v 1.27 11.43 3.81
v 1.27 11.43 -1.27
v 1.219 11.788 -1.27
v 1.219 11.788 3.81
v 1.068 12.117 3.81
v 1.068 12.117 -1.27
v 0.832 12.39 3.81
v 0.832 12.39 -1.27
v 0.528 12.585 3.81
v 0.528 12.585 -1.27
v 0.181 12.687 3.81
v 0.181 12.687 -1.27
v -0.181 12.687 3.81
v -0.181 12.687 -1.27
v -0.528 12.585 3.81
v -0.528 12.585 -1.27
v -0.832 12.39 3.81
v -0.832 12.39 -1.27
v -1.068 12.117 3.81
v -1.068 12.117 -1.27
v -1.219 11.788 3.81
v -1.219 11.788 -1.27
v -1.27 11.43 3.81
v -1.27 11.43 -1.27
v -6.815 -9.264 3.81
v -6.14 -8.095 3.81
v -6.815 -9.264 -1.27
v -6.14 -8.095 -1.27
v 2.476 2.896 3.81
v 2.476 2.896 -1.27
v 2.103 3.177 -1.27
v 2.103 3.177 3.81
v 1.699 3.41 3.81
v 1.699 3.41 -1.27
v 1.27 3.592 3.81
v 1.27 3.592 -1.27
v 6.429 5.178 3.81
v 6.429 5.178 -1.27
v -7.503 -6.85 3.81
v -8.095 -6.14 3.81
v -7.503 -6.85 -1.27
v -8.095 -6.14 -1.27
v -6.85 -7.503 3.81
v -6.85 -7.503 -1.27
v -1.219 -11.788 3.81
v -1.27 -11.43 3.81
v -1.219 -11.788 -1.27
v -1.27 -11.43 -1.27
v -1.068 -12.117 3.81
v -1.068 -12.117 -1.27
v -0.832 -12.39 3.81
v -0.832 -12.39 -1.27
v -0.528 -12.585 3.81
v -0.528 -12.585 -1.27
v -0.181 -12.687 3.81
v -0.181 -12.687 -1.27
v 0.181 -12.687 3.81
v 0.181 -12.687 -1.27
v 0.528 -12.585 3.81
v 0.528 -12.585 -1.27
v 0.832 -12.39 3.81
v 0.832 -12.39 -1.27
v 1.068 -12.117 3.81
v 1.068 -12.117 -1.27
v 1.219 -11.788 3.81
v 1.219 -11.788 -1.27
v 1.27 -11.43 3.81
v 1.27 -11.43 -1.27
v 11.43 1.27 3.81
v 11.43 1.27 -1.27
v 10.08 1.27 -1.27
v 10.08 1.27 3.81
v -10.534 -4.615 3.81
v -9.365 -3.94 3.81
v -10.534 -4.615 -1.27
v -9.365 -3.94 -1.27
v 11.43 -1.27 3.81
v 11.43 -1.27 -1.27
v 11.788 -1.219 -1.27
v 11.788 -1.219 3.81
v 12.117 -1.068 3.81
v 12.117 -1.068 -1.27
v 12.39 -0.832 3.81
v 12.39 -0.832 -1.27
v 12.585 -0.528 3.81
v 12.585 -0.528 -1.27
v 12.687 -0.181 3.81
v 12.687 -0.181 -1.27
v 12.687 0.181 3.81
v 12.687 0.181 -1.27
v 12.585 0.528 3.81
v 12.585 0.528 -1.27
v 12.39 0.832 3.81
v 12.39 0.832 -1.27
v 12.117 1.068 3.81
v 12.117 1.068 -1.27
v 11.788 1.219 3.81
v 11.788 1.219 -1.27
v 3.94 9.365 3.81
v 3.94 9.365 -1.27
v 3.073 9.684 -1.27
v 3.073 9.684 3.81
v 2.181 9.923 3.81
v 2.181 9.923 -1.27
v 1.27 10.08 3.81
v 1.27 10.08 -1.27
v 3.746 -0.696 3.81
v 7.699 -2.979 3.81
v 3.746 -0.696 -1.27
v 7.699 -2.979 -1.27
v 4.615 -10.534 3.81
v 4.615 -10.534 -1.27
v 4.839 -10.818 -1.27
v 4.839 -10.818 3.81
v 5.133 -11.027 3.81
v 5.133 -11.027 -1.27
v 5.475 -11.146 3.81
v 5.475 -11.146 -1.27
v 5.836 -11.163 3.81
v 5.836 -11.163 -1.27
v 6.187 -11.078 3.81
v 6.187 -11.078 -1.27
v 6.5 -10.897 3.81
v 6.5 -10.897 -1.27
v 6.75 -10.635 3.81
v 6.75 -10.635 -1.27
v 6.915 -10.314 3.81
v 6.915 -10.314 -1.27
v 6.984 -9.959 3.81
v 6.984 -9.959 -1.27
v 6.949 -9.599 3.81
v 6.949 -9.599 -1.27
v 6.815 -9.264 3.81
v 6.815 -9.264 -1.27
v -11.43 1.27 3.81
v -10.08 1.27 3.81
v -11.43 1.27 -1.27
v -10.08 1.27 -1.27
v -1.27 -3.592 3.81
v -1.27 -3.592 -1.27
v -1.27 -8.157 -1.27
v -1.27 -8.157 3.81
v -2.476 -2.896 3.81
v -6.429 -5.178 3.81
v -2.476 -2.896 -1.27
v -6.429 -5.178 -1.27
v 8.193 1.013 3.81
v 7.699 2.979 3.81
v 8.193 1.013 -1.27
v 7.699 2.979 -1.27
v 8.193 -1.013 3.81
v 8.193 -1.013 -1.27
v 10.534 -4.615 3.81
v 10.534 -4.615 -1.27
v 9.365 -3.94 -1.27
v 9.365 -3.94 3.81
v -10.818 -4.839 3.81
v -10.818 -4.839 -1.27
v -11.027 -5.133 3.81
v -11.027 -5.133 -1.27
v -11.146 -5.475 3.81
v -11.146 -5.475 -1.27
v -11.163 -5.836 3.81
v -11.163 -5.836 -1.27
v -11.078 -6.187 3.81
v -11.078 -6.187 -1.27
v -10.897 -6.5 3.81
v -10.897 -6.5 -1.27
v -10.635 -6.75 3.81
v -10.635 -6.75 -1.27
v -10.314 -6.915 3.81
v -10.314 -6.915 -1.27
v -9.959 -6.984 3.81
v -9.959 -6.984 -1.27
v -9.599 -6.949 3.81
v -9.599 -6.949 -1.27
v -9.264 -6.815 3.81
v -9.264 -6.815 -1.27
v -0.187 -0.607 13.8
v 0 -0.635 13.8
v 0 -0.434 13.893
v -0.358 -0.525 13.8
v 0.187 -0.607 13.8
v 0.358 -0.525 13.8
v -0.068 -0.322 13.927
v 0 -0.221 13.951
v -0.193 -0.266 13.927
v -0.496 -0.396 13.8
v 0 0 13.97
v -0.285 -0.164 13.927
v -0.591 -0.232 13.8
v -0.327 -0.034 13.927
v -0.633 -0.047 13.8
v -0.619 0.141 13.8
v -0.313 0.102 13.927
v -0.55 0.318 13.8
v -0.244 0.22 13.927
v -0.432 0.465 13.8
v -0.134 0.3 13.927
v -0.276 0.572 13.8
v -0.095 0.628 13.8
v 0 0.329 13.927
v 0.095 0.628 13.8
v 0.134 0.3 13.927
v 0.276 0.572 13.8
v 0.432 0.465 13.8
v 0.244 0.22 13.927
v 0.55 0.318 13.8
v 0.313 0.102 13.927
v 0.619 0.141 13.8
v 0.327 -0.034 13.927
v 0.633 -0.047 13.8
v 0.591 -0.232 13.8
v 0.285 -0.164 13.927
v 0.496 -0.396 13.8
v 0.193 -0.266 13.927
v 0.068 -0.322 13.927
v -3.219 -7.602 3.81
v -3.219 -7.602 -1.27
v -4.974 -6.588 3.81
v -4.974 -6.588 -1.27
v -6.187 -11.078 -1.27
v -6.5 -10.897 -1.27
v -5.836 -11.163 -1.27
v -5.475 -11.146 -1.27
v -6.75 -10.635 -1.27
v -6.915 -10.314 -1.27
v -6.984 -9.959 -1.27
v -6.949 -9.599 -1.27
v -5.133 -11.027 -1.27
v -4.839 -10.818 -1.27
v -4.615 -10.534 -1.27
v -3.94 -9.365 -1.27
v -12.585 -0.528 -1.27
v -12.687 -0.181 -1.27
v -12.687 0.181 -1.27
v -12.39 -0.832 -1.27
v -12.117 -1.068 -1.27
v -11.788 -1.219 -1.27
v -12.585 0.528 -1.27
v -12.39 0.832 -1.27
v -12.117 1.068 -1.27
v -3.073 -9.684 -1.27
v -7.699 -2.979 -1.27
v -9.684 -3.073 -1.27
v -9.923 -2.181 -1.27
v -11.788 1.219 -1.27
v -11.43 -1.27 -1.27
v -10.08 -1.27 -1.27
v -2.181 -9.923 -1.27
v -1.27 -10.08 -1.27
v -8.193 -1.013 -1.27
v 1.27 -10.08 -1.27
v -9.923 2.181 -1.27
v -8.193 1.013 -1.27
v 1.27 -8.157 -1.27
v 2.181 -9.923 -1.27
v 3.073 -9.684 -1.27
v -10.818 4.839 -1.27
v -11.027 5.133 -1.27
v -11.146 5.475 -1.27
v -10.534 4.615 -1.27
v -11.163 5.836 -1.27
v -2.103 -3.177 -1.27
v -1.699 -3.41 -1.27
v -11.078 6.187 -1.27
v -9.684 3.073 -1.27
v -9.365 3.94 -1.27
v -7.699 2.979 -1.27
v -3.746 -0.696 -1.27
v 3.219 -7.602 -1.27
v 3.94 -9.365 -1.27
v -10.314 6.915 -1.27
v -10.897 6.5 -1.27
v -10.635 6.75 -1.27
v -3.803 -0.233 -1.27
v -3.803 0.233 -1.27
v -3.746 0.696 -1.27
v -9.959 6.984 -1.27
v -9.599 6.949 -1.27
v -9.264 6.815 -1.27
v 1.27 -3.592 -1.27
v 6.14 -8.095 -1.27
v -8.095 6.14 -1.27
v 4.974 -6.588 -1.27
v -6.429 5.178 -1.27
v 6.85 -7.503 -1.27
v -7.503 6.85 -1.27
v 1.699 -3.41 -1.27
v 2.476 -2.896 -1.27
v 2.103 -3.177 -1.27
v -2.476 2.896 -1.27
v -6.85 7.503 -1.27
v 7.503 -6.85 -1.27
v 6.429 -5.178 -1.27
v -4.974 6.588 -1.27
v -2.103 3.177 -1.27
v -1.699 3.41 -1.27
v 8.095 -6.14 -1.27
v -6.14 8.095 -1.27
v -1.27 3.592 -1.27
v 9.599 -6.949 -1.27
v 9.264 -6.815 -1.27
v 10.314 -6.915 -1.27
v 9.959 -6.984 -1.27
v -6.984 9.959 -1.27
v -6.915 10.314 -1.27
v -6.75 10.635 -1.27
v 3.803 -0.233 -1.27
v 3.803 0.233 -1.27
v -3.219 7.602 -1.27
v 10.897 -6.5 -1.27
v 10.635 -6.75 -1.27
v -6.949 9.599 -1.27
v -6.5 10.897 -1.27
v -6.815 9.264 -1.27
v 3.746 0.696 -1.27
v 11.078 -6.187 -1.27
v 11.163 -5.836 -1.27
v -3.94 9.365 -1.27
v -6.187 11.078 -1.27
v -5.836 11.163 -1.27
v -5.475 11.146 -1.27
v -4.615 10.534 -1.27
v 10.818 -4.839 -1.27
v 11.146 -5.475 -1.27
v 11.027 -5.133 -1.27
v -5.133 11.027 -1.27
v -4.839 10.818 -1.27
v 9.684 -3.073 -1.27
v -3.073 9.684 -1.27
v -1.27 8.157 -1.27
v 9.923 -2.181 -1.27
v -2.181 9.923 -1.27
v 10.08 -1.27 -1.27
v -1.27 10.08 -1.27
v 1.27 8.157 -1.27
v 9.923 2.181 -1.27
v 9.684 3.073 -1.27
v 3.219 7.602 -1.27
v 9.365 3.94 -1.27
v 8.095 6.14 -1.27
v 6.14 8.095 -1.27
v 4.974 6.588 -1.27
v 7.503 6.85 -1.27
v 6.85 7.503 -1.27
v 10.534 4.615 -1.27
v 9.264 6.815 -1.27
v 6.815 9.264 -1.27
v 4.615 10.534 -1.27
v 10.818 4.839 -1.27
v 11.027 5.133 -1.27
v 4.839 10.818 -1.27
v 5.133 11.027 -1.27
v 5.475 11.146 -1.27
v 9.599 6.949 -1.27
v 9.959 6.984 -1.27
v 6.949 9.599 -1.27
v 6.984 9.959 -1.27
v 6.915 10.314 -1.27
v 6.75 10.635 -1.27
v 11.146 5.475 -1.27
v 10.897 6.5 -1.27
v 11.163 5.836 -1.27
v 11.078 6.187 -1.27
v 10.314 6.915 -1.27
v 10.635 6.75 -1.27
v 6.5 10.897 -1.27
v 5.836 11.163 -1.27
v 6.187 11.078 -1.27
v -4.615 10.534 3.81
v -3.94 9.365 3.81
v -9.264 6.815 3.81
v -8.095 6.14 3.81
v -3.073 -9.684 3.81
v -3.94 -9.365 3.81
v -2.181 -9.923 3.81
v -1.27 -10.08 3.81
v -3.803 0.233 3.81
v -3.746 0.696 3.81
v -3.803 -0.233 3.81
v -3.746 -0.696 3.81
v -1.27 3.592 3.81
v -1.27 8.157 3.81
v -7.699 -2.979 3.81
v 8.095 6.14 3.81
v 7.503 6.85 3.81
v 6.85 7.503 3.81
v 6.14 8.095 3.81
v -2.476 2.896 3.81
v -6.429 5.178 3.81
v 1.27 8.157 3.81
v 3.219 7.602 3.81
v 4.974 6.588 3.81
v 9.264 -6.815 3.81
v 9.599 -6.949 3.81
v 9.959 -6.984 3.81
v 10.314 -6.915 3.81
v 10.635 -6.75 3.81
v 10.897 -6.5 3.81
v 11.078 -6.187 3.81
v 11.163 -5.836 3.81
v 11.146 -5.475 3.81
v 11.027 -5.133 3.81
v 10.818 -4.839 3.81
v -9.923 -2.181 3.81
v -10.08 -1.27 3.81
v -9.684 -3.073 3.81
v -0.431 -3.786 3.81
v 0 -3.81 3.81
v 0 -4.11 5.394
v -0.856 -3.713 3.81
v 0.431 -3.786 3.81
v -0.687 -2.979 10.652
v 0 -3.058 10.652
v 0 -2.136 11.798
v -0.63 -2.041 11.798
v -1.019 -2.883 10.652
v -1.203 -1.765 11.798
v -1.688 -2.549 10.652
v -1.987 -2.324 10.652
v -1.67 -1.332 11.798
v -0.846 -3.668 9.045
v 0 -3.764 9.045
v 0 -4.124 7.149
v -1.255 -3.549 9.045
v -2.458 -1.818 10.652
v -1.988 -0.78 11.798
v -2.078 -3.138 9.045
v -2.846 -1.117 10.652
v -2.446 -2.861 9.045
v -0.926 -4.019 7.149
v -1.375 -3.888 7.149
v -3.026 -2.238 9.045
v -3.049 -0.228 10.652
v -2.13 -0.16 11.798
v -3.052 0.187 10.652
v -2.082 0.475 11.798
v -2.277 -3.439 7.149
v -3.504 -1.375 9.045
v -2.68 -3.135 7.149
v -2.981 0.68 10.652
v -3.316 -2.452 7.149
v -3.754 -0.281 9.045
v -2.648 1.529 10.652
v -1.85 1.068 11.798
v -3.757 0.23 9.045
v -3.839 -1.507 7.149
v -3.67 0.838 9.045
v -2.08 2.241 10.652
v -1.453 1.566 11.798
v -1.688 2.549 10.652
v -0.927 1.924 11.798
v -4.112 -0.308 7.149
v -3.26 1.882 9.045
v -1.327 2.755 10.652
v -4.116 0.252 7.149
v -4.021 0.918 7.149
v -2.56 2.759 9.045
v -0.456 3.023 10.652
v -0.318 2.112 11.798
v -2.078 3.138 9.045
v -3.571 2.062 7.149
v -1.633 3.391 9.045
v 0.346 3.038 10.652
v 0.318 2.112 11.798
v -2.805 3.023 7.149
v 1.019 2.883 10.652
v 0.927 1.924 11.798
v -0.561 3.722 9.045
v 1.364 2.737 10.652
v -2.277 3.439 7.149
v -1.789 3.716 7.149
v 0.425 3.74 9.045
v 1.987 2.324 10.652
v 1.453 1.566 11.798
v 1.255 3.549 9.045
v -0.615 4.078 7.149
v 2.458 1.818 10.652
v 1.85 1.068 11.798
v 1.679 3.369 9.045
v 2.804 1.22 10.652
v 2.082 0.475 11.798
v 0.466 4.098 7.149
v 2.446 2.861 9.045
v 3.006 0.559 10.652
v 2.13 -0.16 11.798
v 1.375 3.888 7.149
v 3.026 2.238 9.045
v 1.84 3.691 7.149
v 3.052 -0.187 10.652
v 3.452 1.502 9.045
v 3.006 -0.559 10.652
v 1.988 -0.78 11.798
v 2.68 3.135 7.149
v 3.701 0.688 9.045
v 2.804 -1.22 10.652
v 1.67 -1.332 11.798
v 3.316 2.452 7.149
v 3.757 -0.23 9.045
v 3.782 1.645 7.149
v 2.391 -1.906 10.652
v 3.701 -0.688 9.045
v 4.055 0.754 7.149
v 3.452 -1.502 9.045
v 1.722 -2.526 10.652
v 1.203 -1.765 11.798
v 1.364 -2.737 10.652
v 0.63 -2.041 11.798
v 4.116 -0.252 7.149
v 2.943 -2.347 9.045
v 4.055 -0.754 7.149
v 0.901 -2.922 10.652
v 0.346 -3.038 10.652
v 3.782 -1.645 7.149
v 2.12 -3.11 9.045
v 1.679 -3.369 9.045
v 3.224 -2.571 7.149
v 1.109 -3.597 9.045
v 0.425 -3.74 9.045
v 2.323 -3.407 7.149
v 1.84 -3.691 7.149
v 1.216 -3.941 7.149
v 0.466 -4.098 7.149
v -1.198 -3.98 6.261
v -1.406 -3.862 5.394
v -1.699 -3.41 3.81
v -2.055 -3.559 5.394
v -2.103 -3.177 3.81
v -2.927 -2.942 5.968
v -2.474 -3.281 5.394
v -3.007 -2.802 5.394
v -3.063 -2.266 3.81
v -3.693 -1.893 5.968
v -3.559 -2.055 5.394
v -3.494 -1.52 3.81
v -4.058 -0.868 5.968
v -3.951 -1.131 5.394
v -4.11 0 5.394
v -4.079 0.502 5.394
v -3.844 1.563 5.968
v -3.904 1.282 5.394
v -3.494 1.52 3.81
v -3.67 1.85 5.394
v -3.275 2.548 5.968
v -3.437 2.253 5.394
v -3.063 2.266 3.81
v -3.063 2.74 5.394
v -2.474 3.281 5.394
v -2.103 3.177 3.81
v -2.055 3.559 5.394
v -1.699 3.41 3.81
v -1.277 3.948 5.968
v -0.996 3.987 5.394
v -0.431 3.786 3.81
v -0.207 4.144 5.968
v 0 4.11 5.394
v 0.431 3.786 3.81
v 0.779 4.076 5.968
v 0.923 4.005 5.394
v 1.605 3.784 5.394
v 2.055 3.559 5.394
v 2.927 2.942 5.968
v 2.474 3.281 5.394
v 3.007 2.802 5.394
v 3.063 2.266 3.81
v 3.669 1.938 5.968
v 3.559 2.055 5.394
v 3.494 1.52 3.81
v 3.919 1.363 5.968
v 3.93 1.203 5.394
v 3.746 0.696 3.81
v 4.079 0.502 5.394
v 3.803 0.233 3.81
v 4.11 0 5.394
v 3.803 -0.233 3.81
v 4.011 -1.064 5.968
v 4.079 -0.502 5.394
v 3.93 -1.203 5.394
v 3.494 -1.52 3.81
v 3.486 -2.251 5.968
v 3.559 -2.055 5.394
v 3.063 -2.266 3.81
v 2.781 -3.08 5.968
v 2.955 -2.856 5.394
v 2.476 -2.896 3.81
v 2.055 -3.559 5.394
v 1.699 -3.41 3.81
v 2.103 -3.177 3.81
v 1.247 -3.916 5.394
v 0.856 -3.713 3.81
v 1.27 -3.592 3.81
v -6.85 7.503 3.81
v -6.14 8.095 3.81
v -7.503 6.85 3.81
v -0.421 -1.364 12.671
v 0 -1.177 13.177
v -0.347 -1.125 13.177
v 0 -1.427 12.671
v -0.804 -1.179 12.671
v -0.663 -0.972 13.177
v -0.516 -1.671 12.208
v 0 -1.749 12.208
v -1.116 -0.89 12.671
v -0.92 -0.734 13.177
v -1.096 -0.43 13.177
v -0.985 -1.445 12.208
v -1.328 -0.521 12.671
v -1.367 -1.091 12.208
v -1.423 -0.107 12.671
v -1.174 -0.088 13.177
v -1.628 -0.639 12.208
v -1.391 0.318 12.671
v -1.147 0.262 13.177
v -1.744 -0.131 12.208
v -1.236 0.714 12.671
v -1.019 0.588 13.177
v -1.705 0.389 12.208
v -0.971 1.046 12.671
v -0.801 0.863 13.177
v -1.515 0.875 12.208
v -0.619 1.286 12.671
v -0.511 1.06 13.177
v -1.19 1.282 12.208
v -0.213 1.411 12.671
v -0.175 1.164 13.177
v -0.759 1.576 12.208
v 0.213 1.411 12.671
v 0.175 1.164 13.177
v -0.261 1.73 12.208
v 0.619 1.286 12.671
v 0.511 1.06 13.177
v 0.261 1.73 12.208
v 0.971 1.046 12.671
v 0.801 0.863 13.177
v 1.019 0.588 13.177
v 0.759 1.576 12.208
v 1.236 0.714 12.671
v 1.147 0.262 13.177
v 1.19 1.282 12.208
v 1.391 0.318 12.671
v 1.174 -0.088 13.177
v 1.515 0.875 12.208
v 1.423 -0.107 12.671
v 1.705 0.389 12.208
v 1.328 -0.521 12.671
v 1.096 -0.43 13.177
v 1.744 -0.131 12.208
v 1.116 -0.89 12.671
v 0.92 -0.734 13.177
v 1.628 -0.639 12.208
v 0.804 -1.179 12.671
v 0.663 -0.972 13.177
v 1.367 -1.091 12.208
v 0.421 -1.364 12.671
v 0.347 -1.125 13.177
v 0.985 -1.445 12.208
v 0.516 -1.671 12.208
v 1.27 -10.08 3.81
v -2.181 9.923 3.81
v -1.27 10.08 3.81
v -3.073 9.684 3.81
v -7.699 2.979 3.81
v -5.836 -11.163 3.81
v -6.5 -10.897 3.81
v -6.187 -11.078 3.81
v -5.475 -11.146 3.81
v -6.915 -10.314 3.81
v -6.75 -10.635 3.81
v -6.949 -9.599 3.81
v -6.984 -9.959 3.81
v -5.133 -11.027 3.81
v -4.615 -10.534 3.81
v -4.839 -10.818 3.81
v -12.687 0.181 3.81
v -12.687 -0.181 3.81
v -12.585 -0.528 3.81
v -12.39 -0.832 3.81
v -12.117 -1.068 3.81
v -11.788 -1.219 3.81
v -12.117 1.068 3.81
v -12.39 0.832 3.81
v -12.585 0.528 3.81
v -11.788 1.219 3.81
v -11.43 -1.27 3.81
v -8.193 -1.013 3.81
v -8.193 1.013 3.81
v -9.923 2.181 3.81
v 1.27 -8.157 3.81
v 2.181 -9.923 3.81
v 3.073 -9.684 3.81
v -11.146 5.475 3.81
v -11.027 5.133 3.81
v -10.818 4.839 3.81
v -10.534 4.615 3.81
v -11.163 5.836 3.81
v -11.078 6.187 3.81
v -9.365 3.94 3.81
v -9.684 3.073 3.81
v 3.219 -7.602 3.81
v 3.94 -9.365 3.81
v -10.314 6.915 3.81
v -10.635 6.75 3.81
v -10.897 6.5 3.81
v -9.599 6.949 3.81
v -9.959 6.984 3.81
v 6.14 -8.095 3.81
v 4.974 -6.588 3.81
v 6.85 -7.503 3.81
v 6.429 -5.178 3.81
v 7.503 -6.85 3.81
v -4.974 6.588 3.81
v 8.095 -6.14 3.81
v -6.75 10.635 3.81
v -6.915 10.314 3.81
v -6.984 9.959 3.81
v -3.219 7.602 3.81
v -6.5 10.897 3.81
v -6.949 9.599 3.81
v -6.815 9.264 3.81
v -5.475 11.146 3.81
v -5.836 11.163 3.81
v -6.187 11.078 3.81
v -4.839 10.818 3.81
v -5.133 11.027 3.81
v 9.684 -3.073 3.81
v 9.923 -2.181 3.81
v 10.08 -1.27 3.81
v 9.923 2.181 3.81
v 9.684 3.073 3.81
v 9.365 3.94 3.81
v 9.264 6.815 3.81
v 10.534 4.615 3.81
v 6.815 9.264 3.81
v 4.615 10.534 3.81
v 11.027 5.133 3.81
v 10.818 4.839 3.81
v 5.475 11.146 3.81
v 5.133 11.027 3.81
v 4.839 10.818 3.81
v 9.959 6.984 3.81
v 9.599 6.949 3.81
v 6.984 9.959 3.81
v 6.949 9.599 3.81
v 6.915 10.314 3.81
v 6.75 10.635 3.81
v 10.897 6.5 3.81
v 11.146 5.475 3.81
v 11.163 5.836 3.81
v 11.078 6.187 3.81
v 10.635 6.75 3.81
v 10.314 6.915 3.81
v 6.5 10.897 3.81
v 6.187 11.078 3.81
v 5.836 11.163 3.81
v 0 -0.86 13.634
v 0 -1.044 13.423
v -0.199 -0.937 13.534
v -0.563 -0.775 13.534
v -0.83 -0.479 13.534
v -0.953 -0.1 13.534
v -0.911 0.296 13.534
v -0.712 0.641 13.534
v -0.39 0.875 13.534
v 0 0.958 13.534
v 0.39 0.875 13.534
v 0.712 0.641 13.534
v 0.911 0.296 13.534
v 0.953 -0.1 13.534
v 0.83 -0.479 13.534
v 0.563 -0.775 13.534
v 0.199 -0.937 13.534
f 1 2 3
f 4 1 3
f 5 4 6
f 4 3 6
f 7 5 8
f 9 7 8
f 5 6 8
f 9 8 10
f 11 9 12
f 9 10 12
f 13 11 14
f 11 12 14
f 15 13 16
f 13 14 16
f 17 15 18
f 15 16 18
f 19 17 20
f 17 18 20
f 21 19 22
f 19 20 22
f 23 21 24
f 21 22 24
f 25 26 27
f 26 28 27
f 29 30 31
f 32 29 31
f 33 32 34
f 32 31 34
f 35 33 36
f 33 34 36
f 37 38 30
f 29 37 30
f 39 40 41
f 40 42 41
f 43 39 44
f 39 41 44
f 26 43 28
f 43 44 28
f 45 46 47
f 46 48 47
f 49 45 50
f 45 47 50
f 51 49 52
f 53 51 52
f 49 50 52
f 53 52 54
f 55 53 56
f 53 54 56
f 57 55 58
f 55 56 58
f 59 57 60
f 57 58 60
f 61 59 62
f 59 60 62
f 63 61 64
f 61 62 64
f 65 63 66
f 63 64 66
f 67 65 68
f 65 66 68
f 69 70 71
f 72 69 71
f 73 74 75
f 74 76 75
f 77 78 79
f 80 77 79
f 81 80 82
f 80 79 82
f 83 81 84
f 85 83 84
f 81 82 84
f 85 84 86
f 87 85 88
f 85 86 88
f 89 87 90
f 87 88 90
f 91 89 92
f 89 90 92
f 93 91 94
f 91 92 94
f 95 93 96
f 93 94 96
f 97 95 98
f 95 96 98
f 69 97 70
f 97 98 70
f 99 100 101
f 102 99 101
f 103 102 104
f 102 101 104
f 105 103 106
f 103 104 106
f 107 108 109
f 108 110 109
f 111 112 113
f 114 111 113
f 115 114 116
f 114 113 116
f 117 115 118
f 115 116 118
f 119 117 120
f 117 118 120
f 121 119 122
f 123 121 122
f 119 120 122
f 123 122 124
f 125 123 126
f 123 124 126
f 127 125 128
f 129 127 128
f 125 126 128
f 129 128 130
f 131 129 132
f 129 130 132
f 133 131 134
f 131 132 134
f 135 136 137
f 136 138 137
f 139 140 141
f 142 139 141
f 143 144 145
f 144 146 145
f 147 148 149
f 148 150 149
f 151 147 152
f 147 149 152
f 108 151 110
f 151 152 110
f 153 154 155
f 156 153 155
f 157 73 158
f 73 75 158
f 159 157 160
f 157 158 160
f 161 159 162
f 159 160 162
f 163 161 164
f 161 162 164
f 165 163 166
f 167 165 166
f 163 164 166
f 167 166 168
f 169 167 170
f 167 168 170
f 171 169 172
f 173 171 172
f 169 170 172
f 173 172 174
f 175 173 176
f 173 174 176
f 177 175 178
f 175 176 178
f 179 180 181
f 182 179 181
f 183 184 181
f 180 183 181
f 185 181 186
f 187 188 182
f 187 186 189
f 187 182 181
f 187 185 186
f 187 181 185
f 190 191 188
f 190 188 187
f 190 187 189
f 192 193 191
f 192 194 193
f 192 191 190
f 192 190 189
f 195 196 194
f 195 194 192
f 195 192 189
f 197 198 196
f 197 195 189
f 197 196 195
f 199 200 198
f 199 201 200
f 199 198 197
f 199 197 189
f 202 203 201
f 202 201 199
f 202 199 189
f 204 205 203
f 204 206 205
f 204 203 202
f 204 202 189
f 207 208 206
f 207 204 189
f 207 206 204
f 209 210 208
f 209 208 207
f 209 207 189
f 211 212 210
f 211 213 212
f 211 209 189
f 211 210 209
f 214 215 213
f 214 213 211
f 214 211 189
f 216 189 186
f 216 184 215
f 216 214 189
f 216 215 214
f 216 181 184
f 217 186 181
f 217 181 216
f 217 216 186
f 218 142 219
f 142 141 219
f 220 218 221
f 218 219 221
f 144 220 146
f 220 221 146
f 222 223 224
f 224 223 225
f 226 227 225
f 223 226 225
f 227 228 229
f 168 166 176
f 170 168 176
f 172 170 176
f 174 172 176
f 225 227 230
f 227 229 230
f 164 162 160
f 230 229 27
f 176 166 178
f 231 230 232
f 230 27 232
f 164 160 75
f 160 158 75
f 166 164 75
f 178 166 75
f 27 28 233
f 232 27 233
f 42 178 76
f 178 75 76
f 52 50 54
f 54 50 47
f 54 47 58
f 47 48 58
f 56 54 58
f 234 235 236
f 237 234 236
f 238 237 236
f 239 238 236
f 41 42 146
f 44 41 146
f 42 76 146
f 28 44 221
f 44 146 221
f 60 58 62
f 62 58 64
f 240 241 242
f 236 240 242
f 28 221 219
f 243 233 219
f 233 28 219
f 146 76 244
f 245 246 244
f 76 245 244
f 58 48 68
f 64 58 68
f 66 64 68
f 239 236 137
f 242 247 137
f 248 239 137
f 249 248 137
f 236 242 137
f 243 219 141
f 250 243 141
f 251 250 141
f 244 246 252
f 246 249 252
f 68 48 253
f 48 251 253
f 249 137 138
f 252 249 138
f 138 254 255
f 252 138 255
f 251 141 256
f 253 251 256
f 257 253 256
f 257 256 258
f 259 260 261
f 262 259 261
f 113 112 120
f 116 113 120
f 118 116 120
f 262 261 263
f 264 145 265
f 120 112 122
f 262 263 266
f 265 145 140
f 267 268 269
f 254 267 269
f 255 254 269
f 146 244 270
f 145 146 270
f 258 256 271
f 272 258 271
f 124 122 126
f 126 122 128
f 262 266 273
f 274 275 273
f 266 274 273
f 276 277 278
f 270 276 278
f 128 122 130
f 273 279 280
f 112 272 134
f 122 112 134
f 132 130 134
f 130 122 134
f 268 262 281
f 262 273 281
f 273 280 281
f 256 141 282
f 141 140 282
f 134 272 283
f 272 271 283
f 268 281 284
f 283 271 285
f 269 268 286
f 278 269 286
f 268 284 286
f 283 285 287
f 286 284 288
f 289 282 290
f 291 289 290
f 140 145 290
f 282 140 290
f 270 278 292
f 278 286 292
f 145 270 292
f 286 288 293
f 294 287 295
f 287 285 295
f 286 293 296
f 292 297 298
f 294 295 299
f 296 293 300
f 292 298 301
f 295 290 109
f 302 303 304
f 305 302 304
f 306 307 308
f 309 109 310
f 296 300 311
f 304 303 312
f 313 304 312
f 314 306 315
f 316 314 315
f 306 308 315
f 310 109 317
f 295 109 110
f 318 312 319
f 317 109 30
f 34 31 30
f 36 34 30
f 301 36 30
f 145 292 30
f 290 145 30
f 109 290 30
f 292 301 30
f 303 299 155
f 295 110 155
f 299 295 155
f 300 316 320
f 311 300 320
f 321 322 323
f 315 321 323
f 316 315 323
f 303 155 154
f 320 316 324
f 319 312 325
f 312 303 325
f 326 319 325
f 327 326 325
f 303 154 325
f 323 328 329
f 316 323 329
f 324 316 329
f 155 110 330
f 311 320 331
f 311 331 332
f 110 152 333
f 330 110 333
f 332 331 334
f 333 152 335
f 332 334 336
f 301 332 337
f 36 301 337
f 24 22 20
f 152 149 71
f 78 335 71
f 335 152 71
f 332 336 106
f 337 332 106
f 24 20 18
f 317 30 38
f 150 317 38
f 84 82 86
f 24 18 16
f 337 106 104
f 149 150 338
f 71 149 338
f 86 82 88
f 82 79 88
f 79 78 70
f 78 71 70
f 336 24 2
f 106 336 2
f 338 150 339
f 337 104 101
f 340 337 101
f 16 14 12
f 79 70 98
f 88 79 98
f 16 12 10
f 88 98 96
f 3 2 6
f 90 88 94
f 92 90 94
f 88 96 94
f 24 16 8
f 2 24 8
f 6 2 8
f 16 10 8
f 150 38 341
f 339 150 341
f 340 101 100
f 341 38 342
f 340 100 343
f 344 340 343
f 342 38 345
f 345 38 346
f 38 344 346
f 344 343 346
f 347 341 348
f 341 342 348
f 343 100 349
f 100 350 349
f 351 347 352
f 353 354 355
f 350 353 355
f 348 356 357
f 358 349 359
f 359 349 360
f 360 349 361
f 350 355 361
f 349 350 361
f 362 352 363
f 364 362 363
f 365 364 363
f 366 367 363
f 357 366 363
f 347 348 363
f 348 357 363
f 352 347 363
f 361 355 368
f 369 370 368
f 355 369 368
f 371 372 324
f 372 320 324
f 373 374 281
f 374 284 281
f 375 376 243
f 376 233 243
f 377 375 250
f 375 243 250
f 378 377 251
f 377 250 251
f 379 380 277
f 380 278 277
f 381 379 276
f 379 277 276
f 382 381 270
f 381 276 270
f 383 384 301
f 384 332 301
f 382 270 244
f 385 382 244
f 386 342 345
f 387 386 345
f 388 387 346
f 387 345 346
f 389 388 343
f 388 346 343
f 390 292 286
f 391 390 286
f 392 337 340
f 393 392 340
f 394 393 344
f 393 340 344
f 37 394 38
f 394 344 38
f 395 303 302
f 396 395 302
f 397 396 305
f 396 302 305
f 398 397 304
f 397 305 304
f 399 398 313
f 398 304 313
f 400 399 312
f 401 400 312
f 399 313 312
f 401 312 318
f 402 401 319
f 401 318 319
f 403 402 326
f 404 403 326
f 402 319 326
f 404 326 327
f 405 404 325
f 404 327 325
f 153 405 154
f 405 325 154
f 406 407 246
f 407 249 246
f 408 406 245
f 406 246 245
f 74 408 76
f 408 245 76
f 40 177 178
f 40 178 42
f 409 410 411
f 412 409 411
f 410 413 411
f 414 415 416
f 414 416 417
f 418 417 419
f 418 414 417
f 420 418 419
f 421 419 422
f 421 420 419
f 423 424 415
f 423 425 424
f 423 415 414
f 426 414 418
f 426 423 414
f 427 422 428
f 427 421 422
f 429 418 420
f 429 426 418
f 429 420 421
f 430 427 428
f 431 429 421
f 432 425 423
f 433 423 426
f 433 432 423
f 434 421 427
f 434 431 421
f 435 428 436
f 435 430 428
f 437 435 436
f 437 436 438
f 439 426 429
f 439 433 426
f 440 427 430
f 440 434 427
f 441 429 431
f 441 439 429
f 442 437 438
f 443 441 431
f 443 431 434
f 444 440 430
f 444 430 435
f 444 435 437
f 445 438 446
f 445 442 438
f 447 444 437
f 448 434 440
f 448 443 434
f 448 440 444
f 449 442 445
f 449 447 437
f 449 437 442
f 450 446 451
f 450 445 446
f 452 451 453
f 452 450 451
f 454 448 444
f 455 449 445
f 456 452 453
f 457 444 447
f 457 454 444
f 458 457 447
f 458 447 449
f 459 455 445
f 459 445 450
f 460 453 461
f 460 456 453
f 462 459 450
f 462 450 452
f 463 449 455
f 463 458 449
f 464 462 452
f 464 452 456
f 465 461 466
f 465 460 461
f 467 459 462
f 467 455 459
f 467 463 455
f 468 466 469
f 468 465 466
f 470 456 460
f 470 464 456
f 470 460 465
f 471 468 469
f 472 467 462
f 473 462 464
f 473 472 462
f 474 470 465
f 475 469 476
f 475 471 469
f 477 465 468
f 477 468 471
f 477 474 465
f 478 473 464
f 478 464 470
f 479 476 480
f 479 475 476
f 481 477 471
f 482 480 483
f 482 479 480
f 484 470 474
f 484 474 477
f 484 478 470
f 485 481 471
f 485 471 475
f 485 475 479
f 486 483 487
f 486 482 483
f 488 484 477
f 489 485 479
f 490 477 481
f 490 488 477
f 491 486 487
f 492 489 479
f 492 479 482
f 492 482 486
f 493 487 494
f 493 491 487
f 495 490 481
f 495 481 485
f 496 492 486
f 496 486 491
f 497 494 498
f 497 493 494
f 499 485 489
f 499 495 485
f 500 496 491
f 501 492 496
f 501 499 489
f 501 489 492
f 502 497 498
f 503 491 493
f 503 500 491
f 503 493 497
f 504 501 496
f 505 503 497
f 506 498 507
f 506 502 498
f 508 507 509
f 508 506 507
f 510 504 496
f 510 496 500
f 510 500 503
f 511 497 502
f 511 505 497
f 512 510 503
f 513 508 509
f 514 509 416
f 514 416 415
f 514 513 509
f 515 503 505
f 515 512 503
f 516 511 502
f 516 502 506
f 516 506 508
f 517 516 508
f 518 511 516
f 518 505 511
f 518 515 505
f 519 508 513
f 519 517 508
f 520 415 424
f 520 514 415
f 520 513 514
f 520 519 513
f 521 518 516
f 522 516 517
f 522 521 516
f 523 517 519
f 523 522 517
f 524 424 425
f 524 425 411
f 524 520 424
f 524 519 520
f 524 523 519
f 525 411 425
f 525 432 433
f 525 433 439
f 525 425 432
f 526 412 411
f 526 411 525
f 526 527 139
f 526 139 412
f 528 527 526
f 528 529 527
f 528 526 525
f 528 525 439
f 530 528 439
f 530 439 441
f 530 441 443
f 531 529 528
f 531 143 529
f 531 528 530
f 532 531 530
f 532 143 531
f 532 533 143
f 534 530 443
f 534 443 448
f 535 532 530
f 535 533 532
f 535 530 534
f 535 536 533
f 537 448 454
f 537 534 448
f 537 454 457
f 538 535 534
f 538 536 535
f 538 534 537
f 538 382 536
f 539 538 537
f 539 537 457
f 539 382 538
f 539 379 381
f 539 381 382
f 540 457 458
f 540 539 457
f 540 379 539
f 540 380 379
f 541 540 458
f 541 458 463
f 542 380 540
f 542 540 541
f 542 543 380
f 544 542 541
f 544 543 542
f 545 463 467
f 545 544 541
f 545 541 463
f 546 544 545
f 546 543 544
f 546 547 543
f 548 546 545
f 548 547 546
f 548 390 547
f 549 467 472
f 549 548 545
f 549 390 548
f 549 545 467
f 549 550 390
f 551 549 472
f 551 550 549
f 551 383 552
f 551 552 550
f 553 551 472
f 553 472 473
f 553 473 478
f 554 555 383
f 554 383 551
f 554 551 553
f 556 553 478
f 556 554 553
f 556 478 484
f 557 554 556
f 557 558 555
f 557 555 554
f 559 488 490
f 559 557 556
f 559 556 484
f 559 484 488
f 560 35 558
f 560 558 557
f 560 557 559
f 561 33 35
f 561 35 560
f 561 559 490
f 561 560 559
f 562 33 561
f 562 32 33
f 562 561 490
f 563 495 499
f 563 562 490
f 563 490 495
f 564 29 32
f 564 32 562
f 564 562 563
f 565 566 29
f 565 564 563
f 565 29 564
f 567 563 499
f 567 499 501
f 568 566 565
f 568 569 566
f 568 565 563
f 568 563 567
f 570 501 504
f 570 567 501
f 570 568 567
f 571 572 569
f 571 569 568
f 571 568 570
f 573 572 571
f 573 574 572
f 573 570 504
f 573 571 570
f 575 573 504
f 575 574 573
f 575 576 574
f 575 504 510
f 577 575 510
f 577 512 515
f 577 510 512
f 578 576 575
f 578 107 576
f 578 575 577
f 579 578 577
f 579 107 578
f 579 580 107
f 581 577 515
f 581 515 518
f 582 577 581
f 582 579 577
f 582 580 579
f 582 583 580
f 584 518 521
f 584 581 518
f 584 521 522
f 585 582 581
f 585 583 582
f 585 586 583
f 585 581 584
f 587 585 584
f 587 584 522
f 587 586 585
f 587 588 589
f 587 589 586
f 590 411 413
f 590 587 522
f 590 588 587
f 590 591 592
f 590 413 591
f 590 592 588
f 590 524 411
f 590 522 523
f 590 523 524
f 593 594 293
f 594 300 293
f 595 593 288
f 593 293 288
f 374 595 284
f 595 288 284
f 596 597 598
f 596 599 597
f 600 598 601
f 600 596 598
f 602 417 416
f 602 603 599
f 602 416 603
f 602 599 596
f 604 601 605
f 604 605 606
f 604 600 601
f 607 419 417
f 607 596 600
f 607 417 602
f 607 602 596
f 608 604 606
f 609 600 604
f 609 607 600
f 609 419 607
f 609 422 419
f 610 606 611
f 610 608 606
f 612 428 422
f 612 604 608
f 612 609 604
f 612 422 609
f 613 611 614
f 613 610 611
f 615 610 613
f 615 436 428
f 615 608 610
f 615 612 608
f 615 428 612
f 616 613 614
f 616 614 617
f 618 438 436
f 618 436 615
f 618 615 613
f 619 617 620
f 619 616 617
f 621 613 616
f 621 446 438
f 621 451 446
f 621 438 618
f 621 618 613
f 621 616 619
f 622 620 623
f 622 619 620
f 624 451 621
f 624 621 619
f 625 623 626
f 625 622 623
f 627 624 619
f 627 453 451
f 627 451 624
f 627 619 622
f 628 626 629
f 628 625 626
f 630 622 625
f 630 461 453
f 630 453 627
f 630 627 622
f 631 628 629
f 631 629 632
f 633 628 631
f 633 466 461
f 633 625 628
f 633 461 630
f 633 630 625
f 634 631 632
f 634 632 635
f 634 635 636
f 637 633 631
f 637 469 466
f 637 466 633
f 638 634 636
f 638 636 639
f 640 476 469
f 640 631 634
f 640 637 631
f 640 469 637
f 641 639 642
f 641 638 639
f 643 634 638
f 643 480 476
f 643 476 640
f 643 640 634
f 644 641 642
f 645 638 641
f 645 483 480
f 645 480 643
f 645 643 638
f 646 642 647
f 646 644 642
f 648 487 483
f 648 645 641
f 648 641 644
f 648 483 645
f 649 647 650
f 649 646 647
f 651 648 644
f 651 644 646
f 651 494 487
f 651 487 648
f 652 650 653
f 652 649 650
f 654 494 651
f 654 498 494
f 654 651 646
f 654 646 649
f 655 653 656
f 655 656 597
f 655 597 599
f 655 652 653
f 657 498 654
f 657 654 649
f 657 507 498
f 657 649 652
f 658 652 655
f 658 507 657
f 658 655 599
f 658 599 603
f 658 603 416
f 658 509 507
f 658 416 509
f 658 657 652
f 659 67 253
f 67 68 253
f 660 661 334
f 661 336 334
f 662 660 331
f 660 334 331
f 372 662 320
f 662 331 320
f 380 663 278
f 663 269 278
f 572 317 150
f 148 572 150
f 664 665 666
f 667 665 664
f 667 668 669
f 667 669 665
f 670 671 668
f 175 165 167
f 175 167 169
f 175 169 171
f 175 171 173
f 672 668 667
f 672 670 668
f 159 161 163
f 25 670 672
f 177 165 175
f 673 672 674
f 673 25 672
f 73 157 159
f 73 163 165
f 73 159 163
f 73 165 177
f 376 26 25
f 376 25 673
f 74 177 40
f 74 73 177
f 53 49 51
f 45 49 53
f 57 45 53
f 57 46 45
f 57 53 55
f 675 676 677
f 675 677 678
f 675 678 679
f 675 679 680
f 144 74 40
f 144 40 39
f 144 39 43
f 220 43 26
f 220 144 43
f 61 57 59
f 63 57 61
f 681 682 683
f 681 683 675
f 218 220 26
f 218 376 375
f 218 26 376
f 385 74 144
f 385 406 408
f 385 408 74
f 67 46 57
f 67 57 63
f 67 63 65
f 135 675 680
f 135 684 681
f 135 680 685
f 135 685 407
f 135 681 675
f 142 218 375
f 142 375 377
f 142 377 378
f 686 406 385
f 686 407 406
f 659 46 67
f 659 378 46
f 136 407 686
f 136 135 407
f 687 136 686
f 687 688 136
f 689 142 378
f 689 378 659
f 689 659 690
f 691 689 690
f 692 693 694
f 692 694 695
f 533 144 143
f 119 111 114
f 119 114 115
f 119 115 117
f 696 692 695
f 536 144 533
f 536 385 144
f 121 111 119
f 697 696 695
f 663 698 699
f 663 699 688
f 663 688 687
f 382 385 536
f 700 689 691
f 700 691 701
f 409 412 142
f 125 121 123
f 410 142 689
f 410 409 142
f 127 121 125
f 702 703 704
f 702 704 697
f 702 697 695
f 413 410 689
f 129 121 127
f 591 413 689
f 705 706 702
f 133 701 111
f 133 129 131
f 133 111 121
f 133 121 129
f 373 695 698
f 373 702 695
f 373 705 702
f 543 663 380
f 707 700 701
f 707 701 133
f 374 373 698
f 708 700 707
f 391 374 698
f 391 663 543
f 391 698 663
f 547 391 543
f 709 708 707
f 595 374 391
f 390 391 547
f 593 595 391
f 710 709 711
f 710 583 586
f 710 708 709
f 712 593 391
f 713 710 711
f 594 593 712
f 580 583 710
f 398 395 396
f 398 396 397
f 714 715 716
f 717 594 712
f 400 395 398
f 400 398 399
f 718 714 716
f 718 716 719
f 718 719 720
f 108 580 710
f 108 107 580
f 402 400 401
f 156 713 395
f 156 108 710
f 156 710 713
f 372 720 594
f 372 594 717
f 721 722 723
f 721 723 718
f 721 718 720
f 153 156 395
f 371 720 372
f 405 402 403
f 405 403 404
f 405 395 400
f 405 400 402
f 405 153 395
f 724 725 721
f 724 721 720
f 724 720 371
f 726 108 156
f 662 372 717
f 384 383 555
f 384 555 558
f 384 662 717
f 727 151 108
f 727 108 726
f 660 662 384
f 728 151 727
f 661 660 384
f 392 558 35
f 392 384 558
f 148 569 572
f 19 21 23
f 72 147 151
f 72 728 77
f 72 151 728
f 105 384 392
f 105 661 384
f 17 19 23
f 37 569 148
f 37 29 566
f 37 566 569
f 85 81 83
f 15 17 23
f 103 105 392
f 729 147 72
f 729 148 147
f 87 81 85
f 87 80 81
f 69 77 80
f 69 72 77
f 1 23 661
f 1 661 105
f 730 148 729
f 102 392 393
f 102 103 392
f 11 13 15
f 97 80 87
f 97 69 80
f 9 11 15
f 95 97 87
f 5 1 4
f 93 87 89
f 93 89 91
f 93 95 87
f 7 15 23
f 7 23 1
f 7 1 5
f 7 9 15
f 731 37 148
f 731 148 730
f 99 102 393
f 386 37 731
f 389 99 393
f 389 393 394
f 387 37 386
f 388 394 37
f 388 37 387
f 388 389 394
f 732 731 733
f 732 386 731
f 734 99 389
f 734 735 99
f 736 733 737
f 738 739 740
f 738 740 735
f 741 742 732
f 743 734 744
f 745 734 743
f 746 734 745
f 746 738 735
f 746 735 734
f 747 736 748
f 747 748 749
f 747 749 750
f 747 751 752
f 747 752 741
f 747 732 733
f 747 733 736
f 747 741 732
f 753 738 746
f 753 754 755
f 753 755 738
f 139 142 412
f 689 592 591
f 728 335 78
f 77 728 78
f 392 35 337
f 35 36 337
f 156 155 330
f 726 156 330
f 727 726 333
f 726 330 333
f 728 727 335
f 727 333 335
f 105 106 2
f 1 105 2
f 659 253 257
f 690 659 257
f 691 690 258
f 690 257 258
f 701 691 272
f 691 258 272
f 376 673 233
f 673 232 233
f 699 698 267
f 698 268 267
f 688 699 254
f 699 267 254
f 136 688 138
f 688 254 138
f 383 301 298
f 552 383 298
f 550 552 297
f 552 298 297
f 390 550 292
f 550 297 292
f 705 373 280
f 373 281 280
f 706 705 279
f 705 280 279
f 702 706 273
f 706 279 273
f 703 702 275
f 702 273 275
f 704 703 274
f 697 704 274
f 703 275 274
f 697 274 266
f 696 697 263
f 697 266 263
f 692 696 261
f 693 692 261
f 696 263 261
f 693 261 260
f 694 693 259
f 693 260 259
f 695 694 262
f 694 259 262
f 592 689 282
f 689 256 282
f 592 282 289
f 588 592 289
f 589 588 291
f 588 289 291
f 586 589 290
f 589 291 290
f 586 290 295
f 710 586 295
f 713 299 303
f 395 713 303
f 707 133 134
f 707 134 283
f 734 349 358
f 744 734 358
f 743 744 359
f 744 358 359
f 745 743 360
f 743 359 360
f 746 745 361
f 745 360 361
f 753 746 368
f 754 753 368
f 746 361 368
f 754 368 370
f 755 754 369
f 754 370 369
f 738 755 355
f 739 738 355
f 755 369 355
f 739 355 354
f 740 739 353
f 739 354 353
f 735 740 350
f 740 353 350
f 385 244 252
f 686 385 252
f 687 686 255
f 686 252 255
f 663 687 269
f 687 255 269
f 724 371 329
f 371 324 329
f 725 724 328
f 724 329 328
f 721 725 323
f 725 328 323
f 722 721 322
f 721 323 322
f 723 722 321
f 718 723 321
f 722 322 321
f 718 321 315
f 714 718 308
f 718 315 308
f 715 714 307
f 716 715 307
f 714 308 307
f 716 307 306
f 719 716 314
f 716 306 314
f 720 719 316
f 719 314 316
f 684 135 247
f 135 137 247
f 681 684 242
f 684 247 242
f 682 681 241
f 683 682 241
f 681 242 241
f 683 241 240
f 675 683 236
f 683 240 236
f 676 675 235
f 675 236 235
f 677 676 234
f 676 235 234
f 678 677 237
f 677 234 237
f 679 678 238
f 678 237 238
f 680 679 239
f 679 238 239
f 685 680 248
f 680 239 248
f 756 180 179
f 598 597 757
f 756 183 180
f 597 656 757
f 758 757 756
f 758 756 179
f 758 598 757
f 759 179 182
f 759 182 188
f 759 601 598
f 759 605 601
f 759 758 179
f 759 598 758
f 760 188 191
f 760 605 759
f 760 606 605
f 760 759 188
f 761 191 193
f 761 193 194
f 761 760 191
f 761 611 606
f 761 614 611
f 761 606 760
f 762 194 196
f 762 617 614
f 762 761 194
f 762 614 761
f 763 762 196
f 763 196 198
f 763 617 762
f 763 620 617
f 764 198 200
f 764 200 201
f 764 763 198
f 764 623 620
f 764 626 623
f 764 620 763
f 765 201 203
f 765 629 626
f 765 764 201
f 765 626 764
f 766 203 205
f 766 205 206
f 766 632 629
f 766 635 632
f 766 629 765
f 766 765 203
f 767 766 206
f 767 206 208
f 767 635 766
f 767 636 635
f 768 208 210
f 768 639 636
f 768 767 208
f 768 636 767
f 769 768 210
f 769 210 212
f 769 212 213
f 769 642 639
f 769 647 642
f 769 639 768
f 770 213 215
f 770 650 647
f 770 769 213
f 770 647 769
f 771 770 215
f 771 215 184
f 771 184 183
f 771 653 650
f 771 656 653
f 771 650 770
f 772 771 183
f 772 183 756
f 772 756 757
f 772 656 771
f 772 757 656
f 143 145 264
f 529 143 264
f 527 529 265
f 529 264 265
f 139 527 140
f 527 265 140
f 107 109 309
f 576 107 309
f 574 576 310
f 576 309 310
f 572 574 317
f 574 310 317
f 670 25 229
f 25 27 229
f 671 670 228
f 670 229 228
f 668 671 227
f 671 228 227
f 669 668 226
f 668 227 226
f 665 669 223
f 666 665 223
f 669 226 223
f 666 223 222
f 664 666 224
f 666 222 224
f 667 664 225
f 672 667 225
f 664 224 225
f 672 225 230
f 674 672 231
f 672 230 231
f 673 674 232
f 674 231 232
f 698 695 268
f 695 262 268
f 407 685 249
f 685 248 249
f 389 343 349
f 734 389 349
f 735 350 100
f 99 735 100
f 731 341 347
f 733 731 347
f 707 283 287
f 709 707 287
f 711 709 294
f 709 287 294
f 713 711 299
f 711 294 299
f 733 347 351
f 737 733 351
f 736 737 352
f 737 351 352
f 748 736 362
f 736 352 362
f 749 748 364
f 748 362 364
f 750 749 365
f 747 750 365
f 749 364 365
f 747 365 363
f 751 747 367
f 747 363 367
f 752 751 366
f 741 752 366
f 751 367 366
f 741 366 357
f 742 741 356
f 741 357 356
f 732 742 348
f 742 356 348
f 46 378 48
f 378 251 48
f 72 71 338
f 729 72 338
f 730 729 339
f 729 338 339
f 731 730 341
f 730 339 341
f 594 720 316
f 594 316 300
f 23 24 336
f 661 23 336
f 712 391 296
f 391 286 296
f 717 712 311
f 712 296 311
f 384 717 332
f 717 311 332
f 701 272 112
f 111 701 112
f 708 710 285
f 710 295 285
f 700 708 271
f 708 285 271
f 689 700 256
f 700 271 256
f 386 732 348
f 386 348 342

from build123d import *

# Parameters (mm, degrees)
F1_DEPTH = 1.27
F2_DEPTH = 3.81


with BuildPart() as f1:
    # F0 (on Top) → F1 (new body)
    with BuildSketch(Plane.XY):
        with BuildLine():
            Line((-1.27, 11.43), (-1.27, 10.0803124952))
            ThreePointArc((-1.27, 10.0803124952), (-2.6296014982, 9.8138063951), (-3.9403039848, 9.3648066989))
            Line((-3.9403039848, 9.3648066989), (-4.6151477372, 10.5336703653))
            ThreePointArc((-4.6151477372, 10.5336703653), (-6.35, 10.9985226281), (-6.8148522628, 9.2636703653))
            Line((-6.8148522628, 9.2636703653), (-6.1400085104, 8.0948066989))
            ThreePointArc((-6.1400085104, 8.0948066989), (-7.1842048969, 7.1842048969), (-8.0948066989, 6.1400085104))
            Line((-8.0948066989, 6.1400085104), (-9.2636703653, 6.8148522628))
            ThreePointArc((-9.2636703653, 6.8148522628), (-10.9985226281, 6.35), (-10.5336703653, 4.6151477372))
            Line((-10.5336703653, 4.6151477372), (-9.3648066989, 3.9403039848))
            ThreePointArc((-9.3648066989, 3.9403039848), (-9.8138063951, 2.6296014982), (-10.0803124952, 1.27))
            Line((-10.0803124952, 1.27), (-11.43, 1.27))
            ThreePointArc((-11.43, 1.27), (-12.7, 0), (-11.43, -1.27))
            Line((-11.43, -1.27), (-10.0803124952, -1.27))
            ThreePointArc((-10.0803124952, -1.27), (-9.8138063951, -2.6296014982), (-9.3648066989, -3.9403039848))
            Line((-9.3648066989, -3.9403039848), (-10.5336703653, -4.6151477372))
            ThreePointArc((-10.5336703653, -4.6151477372), (-10.9985226281, -6.35), (-9.2636703653, -6.8148522628))
            Line((-9.2636703653, -6.8148522628), (-8.0948066989, -6.1400085104))
            ThreePointArc((-8.0948066989, -6.1400085104), (-7.1842048969, -7.1842048969), (-6.1400085104, -8.0948066989))
            Line((-6.1400085104, -8.0948066989), (-6.8148522628, -9.2636703653))
            ThreePointArc((-6.8148522628, -9.2636703653), (-6.35, -10.9985226281), (-4.6151477372, -10.5336703653))
            Line((-4.6151477372, -10.5336703653), (-3.9403039848, -9.3648066989))
            ThreePointArc((-3.9403039848, -9.3648066989), (-2.6296014982, -9.8138063951), (-1.27, -10.0803124952))
            Line((-1.27, -10.0803124952), (-1.27, -11.43))
            ThreePointArc((-1.27, -11.43), (0, -12.7), (1.27, -11.43))
            Line((1.27, -11.43), (1.27, -10.0803124952))
            ThreePointArc((1.27, -10.0803124952), (2.6296014982, -9.8138063951), (3.9403039848, -9.3648066989))
            Line((3.9403039848, -9.3648066989), (4.6151477372, -10.5336703653))
            ThreePointArc((4.6151477372, -10.5336703653), (6.35, -10.9985226281), (6.8148522628, -9.2636703653))
            Line((6.8148522628, -9.2636703653), (6.1400085104, -8.0948066989))
            ThreePointArc((6.1400085104, -8.0948066989), (7.1842048969, -7.1842048969), (8.0948066989, -6.1400085104))
            Line((8.0948066989, -6.1400085104), (9.2636703653, -6.8148522628))
            ThreePointArc((9.2636703653, -6.8148522628), (10.9985226281, -6.35), (10.5336703653, -4.6151477372))
            Line((10.5336703653, -4.6151477372), (9.3648066989, -3.9403039848))
            ThreePointArc((9.3648066989, -3.9403039848), (9.8138063951, -2.6296014982), (10.0803124952, -1.27))
            Line((10.0803124952, -1.27), (11.43, -1.27))
            ThreePointArc((11.43, -1.27), (12.7, 0), (11.43, 1.27))
            Line((11.43, 1.27), (10.0803124952, 1.27))
            ThreePointArc((10.0803124952, 1.27), (9.8138063951, 2.6296014982), (9.3648066989, 3.9403039848))
            Line((9.3648066989, 3.9403039848), (10.5336703653, 4.6151477372))
            ThreePointArc((10.5336703653, 4.6151477372), (10.9985226281, 6.35), (9.2636703653, 6.8148522628))
            Line((9.2636703653, 6.8148522628), (8.0948066989, 6.1400085104))
            ThreePointArc((8.0948066989, 6.1400085104), (7.1842048969, 7.1842048969), (6.1400085104, 8.0948066989))
            Line((6.1400085104, 8.0948066989), (6.8148522628, 9.2636703653))
            ThreePointArc((6.8148522628, 9.2636703653), (6.35, 10.9985226281), (4.6151477372, 10.5336703653))
            Line((4.6151477372, 10.5336703653), (3.9403039848, 9.3648066989))
            ThreePointArc((3.9403039848, 9.3648066989), (2.6296014982, 9.8138063951), (1.27, 10.0803124952))
            Line((1.27, 10.0803124952), (1.27, 11.43))
            ThreePointArc((1.27, 11.43), (0, 12.7), (-1.27, 11.43))
        make_face()
        with BuildLine():
            ThreePointArc((-1.27, -8.1567226875), (-4.1275, -7.1490397082), (-6.428929059, -5.1782136065))
            Line((-6.428929059, -5.1782136065), (-2.4758519733, -2.895903487))
            ThreePointArc((-2.4758519733, -2.895903487), (-1.905, -3.2995567884), (-1.27, -3.5921024484))
            Line((-1.27, -3.5921024484), (-1.27, -8.1567226875))
        make_face(mode=Mode.SUBTRACT)
        with BuildLine():
            ThreePointArc((6.428929059, -5.1782136065), (4.1275, -7.1490397082), (1.27, -8.1567226875))
            Line((1.27, -8.1567226875), (1.27, -3.5921024484))
            ThreePointArc((1.27, -3.5921024484), (1.905, -3.2995567884), (2.4758519733, -2.895903487))
            Line((2.4758519733, -2.895903487), (6.428929059, -5.1782136065))
        make_face(mode=Mode.SUBTRACT)
        with BuildLine():
            ThreePointArc((7.698929059, 2.9785090809), (8.255, 0), (7.698929059, -2.9785090809))
            Line((7.698929059, -2.9785090809), (3.7458519733, -0.6961989614))
            ThreePointArc((3.7458519733, -0.6961989614), (3.81, 0), (3.7458519733, 0.6961989614))
            Line((3.7458519733, 0.6961989614), (7.698929059, 2.9785090809))
        make_face(mode=Mode.SUBTRACT)
        with BuildLine():
            Line((-7.698929059, 2.9785090809), (-3.7458519733, 0.6961989614))
            ThreePointArc((-3.7458519733, 0.6961989614), (-3.81, 0), (-3.7458519733, -0.6961989614))
            Line((-3.7458519733, -0.6961989614), (-7.698929059, -2.9785090809))
            ThreePointArc((-7.698929059, -2.9785090809), (-8.255, 0), (-7.698929059, 2.9785090809))
        make_face(mode=Mode.SUBTRACT)
        with BuildLine():
            ThreePointArc((-6.428929059, 5.1782136065), (-4.1275, 7.1490397082), (-1.27, 8.1567226875))
            Line((-1.27, 8.1567226875), (-1.27, 3.5921024484))
            ThreePointArc((-1.27, 3.5921024484), (-1.905, 3.2995567884), (-2.4758519733, 2.895903487))
            Line((-2.4758519733, 2.895903487), (-6.428929059, 5.1782136065))
        make_face(mode=Mode.SUBTRACT)
        with BuildLine():
            Line((1.27, 3.5921024484), (1.27, 8.1567226875))
            ThreePointArc((1.27, 8.1567226875), (4.1275, 7.1490397082), (6.428929059, 5.1782136065))
            Line((6.428929059, 5.1782136065), (2.4758519733, 2.895903487))
            ThreePointArc((2.4758519733, 2.895903487), (1.905, 3.2995567884), (1.27, 3.5921024484))
        make_face(mode=Mode.SUBTRACT)
    extrude(amount=-F1_DEPTH)

    # F0 (on Top) → F2 (join)
    with BuildSketch(Plane.XY):
        with BuildLine():
            Line((-1.27, 11.43), (-1.27, 10.0803124952))
            ThreePointArc((-1.27, 10.0803124952), (-2.6296014982, 9.8138063951), (-3.9403039848, 9.3648066989))
            Line((-3.9403039848, 9.3648066989), (-4.6151477372, 10.5336703653))
            ThreePointArc((-4.6151477372, 10.5336703653), (-6.35, 10.9985226281), (-6.8148522628, 9.2636703653))
            Line((-6.8148522628, 9.2636703653), (-6.1400085104, 8.0948066989))
            ThreePointArc((-6.1400085104, 8.0948066989), (-7.1842048969, 7.1842048969), (-8.0948066989, 6.1400085104))
            Line((-8.0948066989, 6.1400085104), (-9.2636703653, 6.8148522628))
            ThreePointArc((-9.2636703653, 6.8148522628), (-10.9985226281, 6.35), (-10.5336703653, 4.6151477372))
            Line((-10.5336703653, 4.6151477372), (-9.3648066989, 3.9403039848))
            ThreePointArc((-9.3648066989, 3.9403039848), (-9.8138063951, 2.6296014982), (-10.0803124952, 1.27))
            Line((-10.0803124952, 1.27), (-11.43, 1.27))
            ThreePointArc((-11.43, 1.27), (-12.7, 0), (-11.43, -1.27))
            Line((-11.43, -1.27), (-10.0803124952, -1.27))
            ThreePointArc((-10.0803124952, -1.27), (-9.8138063951, -2.6296014982), (-9.3648066989, -3.9403039848))
            Line((-9.3648066989, -3.9403039848), (-10.5336703653, -4.6151477372))
            ThreePointArc((-10.5336703653, -4.6151477372), (-10.9985226281, -6.35), (-9.2636703653, -6.8148522628))
            Line((-9.2636703653, -6.8148522628), (-8.0948066989, -6.1400085104))
            ThreePointArc((-8.0948066989, -6.1400085104), (-7.1842048969, -7.1842048969), (-6.1400085104, -8.0948066989))
            Line((-6.1400085104, -8.0948066989), (-6.8148522628, -9.2636703653))
            ThreePointArc((-6.8148522628, -9.2636703653), (-6.35, -10.9985226281), (-4.6151477372, -10.5336703653))
            Line((-4.6151477372, -10.5336703653), (-3.9403039848, -9.3648066989))
            ThreePointArc((-3.9403039848, -9.3648066989), (-2.6296014982, -9.8138063951), (-1.27, -10.0803124952))
            Line((-1.27, -10.0803124952), (-1.27, -11.43))
            ThreePointArc((-1.27, -11.43), (0, -12.7), (1.27, -11.43))
            Line((1.27, -11.43), (1.27, -10.0803124952))
            ThreePointArc((1.27, -10.0803124952), (2.6296014982, -9.8138063951), (3.9403039848, -9.3648066989))
            Line((3.9403039848, -9.3648066989), (4.6151477372, -10.5336703653))
            ThreePointArc((4.6151477372, -10.5336703653), (6.35, -10.9985226281), (6.8148522628, -9.2636703653))
            Line((6.8148522628, -9.2636703653), (6.1400085104, -8.0948066989))
            ThreePointArc((6.1400085104, -8.0948066989), (7.1842048969, -7.1842048969), (8.0948066989, -6.1400085104))
            Line((8.0948066989, -6.1400085104), (9.2636703653, -6.8148522628))
            ThreePointArc((9.2636703653, -6.8148522628), (10.9985226281, -6.35), (10.5336703653, -4.6151477372))
            Line((10.5336703653, -4.6151477372), (9.3648066989, -3.9403039848))
            ThreePointArc((9.3648066989, -3.9403039848), (9.8138063951, -2.6296014982), (10.0803124952, -1.27))
            Line((10.0803124952, -1.27), (11.43, -1.27))
            ThreePointArc((11.43, -1.27), (12.7, 0), (11.43, 1.27))
            Line((11.43, 1.27), (10.0803124952, 1.27))
            ThreePointArc((10.0803124952, 1.27), (9.8138063951, 2.6296014982), (9.3648066989, 3.9403039848))
            Line((9.3648066989, 3.9403039848), (10.5336703653, 4.6151477372))
            ThreePointArc((10.5336703653, 4.6151477372), (10.9985226281, 6.35), (9.2636703653, 6.8148522628))
            Line((9.2636703653, 6.8148522628), (8.0948066989, 6.1400085104))
            ThreePointArc((8.0948066989, 6.1400085104), (7.1842048969, 7.1842048969), (6.1400085104, 8.0948066989))
            Line((6.1400085104, 8.0948066989), (6.8148522628, 9.2636703653))
            ThreePointArc((6.8148522628, 9.2636703653), (6.35, 10.9985226281), (4.6151477372, 10.5336703653))
            Line((4.6151477372, 10.5336703653), (3.9403039848, 9.3648066989))
            ThreePointArc((3.9403039848, 9.3648066989), (2.6296014982, 9.8138063951), (1.27, 10.0803124952))
            Line((1.27, 10.0803124952), (1.27, 11.43))
            ThreePointArc((1.27, 11.43), (0, 12.7), (-1.27, 11.43))
        make_face()
        with BuildLine():
            ThreePointArc((-1.27, -8.1567226875), (-4.1275, -7.1490397082), (-6.428929059, -5.1782136065))
            Line((-6.428929059, -5.1782136065), (-2.4758519733, -2.895903487))
            ThreePointArc((-2.4758519733, -2.895903487), (-1.905, -3.2995567884), (-1.27, -3.5921024484))
            Line((-1.27, -3.5921024484), (-1.27, -8.1567226875))
        make_face(mode=Mode.SUBTRACT)
        with BuildLine():
            ThreePointArc((6.428929059, -5.1782136065), (4.1275, -7.1490397082), (1.27, -8.1567226875))
            Line((1.27, -8.1567226875), (1.27, -3.5921024484))
            ThreePointArc((1.27, -3.5921024484), (1.905, -3.2995567884), (2.4758519733, -2.895903487))
            Line((2.4758519733, -2.895903487), (6.428929059, -5.1782136065))
        make_face(mode=Mode.SUBTRACT)
        with BuildLine():
            ThreePointArc((7.698929059, 2.9785090809), (8.255, 0), (7.698929059, -2.9785090809))
            Line((7.698929059, -2.9785090809), (3.7458519733, -0.6961989614))
            ThreePointArc((3.7458519733, -0.6961989614), (3.81, 0), (3.7458519733, 0.6961989614))
            Line((3.7458519733, 0.6961989614), (7.698929059, 2.9785090809))
        make_face(mode=Mode.SUBTRACT)
        with BuildLine():
            Line((-7.698929059, 2.9785090809), (-3.7458519733, 0.6961989614))
            ThreePointArc((-3.7458519733, 0.6961989614), (-3.81, 0), (-3.7458519733, -0.6961989614))
            Line((-3.7458519733, -0.6961989614), (-7.698929059, -2.9785090809))
            ThreePointArc((-7.698929059, -2.9785090809), (-8.255, 0), (-7.698929059, 2.9785090809))
        make_face(mode=Mode.SUBTRACT)
        with BuildLine():
            ThreePointArc((-6.428929059, 5.1782136065), (-4.1275, 7.1490397082), (-1.27, 8.1567226875))
            Line((-1.27, 8.1567226875), (-1.27, 3.5921024484))
            ThreePointArc((-1.27, 3.5921024484), (-1.905, 3.2995567884), (-2.4758519733, 2.895903487))
            Line((-2.4758519733, 2.895903487), (-6.428929059, 5.1782136065))
        make_face(mode=Mode.SUBTRACT)
        with BuildLine():
            Line((1.27, 3.5921024484), (1.27, 8.1567226875))
            ThreePointArc((1.27, 8.1567226875), (4.1275, 7.1490397082), (6.428929059, 5.1782136065))
            Line((6.428929059, 5.1782136065), (2.4758519733, 2.895903487))
            ThreePointArc((2.4758519733, 2.895903487), (1.905, 3.2995567884), (1.27, 3.5921024484))
        make_face(mode=Mode.SUBTRACT)
    extrude(amount=F2_DEPTH)

    # F3 (on Right) → F4 (revolve)
    with BuildSketch(Plane.YZ):
        with BuildLine():
            ThreePointArc((-1.1769498973, 13.1771676217), (-1.5794830695, 12.4338749212), (-2.1359994269, 11.7976308349))
            add(Edge.make_bspline(
                [(-2.1359994269, 11.7976308349), (-5.2723457025, 8.9282099587), (-3.81, 3.81)],
                knots=[3.6812308924, 3.6812308924, 3.6812308924, 5.1239058265, 5.1239058265, 5.1239058265], degree=2, weights=[1, 0.7509231517, 1]))
            Line((-3.81, 3.81), (0, 3.81))
            Line((0, 3.81), (0, 12.7))
            Line((0, 12.7), (0, 13.97))
            ThreePointArc((0, 13.97), (-0.3287001873, 13.9267257994), (-0.635, 13.7998522628))
            ThreePointArc((-0.635, 13.7998522628), (-0.9579794612, 13.5337717624), (-1.1769498973, 13.1771676217))
        make_face()
    revolve(axis=Axis((0, 0, 8.255), (0, 0, -1)))


solid = f1.part
